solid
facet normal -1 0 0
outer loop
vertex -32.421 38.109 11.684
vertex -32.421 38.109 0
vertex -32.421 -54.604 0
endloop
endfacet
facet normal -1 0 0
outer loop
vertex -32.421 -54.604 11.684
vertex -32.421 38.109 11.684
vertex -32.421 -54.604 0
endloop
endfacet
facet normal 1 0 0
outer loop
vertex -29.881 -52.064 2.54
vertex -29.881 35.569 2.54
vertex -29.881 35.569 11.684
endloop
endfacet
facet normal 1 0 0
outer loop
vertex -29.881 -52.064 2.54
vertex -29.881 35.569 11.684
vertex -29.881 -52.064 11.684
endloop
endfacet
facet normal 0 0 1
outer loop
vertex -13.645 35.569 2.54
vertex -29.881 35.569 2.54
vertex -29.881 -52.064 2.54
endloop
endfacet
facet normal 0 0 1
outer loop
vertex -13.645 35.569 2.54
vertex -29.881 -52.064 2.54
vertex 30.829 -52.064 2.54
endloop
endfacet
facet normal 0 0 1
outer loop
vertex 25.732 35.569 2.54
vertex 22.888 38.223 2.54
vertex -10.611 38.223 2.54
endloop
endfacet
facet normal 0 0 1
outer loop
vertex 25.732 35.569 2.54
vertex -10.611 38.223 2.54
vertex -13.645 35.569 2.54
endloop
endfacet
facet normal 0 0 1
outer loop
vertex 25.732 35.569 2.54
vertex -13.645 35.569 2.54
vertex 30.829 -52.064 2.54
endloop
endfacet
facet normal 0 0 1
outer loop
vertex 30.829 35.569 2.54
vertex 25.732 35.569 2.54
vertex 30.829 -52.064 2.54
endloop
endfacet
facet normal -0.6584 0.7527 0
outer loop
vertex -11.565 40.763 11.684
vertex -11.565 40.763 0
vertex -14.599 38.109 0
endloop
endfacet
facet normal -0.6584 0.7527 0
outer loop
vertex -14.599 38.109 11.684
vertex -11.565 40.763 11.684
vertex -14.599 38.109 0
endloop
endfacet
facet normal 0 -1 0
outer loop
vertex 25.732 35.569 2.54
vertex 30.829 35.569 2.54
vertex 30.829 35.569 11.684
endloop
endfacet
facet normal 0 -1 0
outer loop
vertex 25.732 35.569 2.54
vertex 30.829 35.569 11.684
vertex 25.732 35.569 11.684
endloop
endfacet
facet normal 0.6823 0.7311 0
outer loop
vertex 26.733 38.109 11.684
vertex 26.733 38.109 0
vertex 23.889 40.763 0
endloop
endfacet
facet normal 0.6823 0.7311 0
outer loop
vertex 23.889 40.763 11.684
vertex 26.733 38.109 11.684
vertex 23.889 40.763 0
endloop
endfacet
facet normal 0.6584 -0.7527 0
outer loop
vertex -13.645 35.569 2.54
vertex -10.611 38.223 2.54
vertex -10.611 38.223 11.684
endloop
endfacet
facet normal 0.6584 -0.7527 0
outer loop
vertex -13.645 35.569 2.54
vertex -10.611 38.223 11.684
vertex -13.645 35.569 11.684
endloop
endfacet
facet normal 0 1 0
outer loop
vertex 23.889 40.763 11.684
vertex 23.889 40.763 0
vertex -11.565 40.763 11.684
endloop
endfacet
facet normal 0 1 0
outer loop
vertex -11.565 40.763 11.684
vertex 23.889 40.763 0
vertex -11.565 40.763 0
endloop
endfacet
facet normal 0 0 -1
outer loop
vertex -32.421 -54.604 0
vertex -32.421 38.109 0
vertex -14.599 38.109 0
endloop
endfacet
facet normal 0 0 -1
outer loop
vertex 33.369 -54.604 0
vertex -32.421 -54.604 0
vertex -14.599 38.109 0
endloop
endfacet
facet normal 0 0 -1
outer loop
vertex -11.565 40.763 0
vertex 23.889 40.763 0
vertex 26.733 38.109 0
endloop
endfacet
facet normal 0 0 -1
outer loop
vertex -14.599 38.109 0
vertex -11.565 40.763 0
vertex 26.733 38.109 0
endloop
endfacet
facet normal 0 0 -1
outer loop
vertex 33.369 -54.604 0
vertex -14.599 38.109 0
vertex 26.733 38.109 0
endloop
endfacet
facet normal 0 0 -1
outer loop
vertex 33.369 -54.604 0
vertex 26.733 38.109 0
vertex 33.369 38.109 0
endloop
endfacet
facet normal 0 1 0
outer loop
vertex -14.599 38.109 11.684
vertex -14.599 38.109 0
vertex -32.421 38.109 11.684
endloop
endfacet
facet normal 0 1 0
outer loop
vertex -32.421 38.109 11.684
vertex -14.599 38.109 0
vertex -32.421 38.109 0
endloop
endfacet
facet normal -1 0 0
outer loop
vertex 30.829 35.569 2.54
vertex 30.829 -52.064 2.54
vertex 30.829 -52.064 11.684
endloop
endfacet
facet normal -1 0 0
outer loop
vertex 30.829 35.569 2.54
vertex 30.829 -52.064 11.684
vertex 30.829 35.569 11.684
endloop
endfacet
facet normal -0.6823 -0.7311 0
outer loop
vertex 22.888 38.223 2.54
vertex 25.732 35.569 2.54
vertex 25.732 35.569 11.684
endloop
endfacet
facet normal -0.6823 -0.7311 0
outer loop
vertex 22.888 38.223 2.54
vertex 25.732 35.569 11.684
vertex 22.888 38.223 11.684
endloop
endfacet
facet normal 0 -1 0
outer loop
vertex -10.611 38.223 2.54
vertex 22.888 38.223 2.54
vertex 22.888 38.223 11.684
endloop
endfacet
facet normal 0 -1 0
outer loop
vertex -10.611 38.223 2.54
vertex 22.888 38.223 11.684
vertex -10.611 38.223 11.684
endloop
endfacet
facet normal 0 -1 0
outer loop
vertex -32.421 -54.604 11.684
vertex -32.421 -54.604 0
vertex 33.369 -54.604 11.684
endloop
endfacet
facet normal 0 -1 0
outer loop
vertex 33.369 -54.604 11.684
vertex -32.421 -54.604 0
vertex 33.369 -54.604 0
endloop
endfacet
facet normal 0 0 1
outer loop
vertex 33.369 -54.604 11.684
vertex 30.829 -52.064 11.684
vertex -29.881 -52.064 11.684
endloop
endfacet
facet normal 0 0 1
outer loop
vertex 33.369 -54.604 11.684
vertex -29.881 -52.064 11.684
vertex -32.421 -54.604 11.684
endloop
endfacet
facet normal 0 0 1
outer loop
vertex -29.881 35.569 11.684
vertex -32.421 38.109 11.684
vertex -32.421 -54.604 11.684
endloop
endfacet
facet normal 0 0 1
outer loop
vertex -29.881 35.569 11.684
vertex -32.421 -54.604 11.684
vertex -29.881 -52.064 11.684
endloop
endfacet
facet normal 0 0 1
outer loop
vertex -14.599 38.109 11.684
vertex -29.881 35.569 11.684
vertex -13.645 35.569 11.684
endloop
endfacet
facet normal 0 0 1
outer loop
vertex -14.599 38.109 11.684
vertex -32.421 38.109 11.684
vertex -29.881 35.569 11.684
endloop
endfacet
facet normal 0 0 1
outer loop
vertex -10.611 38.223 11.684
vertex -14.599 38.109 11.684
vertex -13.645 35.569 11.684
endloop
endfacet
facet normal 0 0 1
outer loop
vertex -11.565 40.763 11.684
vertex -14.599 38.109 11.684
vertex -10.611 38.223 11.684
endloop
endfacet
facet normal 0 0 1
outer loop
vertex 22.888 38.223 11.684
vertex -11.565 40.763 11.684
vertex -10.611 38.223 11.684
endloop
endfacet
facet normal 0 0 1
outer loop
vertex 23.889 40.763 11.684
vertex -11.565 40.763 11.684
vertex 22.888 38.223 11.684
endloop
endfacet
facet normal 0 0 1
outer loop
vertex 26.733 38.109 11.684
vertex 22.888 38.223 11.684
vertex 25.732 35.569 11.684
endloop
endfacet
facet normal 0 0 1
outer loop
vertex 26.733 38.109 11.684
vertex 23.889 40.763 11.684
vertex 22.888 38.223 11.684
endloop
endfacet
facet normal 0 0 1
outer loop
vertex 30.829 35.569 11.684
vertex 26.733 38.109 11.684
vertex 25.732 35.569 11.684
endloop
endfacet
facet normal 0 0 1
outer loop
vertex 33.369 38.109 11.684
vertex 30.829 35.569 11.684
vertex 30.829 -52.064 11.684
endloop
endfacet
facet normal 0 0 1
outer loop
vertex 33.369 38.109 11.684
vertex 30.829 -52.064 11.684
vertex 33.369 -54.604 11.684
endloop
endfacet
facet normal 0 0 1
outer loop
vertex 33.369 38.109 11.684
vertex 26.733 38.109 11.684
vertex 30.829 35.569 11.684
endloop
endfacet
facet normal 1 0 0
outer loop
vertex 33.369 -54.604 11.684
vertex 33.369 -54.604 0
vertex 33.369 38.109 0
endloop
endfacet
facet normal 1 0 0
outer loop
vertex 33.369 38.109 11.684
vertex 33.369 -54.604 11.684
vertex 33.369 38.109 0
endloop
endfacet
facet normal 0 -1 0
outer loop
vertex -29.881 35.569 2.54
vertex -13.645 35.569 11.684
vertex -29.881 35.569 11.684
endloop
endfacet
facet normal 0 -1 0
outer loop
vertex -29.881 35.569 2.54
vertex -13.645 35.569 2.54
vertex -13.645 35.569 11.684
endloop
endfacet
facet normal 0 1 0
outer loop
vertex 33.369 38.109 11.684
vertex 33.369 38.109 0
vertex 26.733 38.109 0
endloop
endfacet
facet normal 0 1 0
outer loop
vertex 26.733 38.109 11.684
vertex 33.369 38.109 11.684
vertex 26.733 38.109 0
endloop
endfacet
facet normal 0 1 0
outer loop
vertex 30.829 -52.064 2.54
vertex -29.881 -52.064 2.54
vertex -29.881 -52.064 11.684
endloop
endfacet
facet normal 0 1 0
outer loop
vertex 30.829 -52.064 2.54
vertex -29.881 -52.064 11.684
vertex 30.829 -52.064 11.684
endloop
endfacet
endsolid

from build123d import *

# Parameters (mm, degrees)
F1_DEPTH = 11.684
F2_T     = -2.54


with BuildPart() as f1:
    # F0 (on Top) → F1 (new body)
    with BuildSketch(Plane.XY):
        Polygon((-14.5989814773, 38.1090268493), (-32.4211120605, 38.1090268493), (-32.4211120605, -54.6039827168), (33.3690978587, -54.6039827168), (33.3690978587, 38.1090268493), (26.7332009971, 38.1090268493), align=None)
        Polygon((-11.5654272959, 40.7633893192), (-14.5989814773, 38.1090268493), (26.7332009971, 38.1090268493), (23.8892417401, 40.7633893192), align=None)
    extrude(amount=F1_DEPTH)

    # F2
    f2_openings = [f1.faces().sort_by_distance(p)[0] for p in [
        (0.566664, -7.464444, 11.684),
    ]]
    offset(amount=F2_T, openings=f2_openings, kind=Kind.INTERSECTION)


solid = f1.part
